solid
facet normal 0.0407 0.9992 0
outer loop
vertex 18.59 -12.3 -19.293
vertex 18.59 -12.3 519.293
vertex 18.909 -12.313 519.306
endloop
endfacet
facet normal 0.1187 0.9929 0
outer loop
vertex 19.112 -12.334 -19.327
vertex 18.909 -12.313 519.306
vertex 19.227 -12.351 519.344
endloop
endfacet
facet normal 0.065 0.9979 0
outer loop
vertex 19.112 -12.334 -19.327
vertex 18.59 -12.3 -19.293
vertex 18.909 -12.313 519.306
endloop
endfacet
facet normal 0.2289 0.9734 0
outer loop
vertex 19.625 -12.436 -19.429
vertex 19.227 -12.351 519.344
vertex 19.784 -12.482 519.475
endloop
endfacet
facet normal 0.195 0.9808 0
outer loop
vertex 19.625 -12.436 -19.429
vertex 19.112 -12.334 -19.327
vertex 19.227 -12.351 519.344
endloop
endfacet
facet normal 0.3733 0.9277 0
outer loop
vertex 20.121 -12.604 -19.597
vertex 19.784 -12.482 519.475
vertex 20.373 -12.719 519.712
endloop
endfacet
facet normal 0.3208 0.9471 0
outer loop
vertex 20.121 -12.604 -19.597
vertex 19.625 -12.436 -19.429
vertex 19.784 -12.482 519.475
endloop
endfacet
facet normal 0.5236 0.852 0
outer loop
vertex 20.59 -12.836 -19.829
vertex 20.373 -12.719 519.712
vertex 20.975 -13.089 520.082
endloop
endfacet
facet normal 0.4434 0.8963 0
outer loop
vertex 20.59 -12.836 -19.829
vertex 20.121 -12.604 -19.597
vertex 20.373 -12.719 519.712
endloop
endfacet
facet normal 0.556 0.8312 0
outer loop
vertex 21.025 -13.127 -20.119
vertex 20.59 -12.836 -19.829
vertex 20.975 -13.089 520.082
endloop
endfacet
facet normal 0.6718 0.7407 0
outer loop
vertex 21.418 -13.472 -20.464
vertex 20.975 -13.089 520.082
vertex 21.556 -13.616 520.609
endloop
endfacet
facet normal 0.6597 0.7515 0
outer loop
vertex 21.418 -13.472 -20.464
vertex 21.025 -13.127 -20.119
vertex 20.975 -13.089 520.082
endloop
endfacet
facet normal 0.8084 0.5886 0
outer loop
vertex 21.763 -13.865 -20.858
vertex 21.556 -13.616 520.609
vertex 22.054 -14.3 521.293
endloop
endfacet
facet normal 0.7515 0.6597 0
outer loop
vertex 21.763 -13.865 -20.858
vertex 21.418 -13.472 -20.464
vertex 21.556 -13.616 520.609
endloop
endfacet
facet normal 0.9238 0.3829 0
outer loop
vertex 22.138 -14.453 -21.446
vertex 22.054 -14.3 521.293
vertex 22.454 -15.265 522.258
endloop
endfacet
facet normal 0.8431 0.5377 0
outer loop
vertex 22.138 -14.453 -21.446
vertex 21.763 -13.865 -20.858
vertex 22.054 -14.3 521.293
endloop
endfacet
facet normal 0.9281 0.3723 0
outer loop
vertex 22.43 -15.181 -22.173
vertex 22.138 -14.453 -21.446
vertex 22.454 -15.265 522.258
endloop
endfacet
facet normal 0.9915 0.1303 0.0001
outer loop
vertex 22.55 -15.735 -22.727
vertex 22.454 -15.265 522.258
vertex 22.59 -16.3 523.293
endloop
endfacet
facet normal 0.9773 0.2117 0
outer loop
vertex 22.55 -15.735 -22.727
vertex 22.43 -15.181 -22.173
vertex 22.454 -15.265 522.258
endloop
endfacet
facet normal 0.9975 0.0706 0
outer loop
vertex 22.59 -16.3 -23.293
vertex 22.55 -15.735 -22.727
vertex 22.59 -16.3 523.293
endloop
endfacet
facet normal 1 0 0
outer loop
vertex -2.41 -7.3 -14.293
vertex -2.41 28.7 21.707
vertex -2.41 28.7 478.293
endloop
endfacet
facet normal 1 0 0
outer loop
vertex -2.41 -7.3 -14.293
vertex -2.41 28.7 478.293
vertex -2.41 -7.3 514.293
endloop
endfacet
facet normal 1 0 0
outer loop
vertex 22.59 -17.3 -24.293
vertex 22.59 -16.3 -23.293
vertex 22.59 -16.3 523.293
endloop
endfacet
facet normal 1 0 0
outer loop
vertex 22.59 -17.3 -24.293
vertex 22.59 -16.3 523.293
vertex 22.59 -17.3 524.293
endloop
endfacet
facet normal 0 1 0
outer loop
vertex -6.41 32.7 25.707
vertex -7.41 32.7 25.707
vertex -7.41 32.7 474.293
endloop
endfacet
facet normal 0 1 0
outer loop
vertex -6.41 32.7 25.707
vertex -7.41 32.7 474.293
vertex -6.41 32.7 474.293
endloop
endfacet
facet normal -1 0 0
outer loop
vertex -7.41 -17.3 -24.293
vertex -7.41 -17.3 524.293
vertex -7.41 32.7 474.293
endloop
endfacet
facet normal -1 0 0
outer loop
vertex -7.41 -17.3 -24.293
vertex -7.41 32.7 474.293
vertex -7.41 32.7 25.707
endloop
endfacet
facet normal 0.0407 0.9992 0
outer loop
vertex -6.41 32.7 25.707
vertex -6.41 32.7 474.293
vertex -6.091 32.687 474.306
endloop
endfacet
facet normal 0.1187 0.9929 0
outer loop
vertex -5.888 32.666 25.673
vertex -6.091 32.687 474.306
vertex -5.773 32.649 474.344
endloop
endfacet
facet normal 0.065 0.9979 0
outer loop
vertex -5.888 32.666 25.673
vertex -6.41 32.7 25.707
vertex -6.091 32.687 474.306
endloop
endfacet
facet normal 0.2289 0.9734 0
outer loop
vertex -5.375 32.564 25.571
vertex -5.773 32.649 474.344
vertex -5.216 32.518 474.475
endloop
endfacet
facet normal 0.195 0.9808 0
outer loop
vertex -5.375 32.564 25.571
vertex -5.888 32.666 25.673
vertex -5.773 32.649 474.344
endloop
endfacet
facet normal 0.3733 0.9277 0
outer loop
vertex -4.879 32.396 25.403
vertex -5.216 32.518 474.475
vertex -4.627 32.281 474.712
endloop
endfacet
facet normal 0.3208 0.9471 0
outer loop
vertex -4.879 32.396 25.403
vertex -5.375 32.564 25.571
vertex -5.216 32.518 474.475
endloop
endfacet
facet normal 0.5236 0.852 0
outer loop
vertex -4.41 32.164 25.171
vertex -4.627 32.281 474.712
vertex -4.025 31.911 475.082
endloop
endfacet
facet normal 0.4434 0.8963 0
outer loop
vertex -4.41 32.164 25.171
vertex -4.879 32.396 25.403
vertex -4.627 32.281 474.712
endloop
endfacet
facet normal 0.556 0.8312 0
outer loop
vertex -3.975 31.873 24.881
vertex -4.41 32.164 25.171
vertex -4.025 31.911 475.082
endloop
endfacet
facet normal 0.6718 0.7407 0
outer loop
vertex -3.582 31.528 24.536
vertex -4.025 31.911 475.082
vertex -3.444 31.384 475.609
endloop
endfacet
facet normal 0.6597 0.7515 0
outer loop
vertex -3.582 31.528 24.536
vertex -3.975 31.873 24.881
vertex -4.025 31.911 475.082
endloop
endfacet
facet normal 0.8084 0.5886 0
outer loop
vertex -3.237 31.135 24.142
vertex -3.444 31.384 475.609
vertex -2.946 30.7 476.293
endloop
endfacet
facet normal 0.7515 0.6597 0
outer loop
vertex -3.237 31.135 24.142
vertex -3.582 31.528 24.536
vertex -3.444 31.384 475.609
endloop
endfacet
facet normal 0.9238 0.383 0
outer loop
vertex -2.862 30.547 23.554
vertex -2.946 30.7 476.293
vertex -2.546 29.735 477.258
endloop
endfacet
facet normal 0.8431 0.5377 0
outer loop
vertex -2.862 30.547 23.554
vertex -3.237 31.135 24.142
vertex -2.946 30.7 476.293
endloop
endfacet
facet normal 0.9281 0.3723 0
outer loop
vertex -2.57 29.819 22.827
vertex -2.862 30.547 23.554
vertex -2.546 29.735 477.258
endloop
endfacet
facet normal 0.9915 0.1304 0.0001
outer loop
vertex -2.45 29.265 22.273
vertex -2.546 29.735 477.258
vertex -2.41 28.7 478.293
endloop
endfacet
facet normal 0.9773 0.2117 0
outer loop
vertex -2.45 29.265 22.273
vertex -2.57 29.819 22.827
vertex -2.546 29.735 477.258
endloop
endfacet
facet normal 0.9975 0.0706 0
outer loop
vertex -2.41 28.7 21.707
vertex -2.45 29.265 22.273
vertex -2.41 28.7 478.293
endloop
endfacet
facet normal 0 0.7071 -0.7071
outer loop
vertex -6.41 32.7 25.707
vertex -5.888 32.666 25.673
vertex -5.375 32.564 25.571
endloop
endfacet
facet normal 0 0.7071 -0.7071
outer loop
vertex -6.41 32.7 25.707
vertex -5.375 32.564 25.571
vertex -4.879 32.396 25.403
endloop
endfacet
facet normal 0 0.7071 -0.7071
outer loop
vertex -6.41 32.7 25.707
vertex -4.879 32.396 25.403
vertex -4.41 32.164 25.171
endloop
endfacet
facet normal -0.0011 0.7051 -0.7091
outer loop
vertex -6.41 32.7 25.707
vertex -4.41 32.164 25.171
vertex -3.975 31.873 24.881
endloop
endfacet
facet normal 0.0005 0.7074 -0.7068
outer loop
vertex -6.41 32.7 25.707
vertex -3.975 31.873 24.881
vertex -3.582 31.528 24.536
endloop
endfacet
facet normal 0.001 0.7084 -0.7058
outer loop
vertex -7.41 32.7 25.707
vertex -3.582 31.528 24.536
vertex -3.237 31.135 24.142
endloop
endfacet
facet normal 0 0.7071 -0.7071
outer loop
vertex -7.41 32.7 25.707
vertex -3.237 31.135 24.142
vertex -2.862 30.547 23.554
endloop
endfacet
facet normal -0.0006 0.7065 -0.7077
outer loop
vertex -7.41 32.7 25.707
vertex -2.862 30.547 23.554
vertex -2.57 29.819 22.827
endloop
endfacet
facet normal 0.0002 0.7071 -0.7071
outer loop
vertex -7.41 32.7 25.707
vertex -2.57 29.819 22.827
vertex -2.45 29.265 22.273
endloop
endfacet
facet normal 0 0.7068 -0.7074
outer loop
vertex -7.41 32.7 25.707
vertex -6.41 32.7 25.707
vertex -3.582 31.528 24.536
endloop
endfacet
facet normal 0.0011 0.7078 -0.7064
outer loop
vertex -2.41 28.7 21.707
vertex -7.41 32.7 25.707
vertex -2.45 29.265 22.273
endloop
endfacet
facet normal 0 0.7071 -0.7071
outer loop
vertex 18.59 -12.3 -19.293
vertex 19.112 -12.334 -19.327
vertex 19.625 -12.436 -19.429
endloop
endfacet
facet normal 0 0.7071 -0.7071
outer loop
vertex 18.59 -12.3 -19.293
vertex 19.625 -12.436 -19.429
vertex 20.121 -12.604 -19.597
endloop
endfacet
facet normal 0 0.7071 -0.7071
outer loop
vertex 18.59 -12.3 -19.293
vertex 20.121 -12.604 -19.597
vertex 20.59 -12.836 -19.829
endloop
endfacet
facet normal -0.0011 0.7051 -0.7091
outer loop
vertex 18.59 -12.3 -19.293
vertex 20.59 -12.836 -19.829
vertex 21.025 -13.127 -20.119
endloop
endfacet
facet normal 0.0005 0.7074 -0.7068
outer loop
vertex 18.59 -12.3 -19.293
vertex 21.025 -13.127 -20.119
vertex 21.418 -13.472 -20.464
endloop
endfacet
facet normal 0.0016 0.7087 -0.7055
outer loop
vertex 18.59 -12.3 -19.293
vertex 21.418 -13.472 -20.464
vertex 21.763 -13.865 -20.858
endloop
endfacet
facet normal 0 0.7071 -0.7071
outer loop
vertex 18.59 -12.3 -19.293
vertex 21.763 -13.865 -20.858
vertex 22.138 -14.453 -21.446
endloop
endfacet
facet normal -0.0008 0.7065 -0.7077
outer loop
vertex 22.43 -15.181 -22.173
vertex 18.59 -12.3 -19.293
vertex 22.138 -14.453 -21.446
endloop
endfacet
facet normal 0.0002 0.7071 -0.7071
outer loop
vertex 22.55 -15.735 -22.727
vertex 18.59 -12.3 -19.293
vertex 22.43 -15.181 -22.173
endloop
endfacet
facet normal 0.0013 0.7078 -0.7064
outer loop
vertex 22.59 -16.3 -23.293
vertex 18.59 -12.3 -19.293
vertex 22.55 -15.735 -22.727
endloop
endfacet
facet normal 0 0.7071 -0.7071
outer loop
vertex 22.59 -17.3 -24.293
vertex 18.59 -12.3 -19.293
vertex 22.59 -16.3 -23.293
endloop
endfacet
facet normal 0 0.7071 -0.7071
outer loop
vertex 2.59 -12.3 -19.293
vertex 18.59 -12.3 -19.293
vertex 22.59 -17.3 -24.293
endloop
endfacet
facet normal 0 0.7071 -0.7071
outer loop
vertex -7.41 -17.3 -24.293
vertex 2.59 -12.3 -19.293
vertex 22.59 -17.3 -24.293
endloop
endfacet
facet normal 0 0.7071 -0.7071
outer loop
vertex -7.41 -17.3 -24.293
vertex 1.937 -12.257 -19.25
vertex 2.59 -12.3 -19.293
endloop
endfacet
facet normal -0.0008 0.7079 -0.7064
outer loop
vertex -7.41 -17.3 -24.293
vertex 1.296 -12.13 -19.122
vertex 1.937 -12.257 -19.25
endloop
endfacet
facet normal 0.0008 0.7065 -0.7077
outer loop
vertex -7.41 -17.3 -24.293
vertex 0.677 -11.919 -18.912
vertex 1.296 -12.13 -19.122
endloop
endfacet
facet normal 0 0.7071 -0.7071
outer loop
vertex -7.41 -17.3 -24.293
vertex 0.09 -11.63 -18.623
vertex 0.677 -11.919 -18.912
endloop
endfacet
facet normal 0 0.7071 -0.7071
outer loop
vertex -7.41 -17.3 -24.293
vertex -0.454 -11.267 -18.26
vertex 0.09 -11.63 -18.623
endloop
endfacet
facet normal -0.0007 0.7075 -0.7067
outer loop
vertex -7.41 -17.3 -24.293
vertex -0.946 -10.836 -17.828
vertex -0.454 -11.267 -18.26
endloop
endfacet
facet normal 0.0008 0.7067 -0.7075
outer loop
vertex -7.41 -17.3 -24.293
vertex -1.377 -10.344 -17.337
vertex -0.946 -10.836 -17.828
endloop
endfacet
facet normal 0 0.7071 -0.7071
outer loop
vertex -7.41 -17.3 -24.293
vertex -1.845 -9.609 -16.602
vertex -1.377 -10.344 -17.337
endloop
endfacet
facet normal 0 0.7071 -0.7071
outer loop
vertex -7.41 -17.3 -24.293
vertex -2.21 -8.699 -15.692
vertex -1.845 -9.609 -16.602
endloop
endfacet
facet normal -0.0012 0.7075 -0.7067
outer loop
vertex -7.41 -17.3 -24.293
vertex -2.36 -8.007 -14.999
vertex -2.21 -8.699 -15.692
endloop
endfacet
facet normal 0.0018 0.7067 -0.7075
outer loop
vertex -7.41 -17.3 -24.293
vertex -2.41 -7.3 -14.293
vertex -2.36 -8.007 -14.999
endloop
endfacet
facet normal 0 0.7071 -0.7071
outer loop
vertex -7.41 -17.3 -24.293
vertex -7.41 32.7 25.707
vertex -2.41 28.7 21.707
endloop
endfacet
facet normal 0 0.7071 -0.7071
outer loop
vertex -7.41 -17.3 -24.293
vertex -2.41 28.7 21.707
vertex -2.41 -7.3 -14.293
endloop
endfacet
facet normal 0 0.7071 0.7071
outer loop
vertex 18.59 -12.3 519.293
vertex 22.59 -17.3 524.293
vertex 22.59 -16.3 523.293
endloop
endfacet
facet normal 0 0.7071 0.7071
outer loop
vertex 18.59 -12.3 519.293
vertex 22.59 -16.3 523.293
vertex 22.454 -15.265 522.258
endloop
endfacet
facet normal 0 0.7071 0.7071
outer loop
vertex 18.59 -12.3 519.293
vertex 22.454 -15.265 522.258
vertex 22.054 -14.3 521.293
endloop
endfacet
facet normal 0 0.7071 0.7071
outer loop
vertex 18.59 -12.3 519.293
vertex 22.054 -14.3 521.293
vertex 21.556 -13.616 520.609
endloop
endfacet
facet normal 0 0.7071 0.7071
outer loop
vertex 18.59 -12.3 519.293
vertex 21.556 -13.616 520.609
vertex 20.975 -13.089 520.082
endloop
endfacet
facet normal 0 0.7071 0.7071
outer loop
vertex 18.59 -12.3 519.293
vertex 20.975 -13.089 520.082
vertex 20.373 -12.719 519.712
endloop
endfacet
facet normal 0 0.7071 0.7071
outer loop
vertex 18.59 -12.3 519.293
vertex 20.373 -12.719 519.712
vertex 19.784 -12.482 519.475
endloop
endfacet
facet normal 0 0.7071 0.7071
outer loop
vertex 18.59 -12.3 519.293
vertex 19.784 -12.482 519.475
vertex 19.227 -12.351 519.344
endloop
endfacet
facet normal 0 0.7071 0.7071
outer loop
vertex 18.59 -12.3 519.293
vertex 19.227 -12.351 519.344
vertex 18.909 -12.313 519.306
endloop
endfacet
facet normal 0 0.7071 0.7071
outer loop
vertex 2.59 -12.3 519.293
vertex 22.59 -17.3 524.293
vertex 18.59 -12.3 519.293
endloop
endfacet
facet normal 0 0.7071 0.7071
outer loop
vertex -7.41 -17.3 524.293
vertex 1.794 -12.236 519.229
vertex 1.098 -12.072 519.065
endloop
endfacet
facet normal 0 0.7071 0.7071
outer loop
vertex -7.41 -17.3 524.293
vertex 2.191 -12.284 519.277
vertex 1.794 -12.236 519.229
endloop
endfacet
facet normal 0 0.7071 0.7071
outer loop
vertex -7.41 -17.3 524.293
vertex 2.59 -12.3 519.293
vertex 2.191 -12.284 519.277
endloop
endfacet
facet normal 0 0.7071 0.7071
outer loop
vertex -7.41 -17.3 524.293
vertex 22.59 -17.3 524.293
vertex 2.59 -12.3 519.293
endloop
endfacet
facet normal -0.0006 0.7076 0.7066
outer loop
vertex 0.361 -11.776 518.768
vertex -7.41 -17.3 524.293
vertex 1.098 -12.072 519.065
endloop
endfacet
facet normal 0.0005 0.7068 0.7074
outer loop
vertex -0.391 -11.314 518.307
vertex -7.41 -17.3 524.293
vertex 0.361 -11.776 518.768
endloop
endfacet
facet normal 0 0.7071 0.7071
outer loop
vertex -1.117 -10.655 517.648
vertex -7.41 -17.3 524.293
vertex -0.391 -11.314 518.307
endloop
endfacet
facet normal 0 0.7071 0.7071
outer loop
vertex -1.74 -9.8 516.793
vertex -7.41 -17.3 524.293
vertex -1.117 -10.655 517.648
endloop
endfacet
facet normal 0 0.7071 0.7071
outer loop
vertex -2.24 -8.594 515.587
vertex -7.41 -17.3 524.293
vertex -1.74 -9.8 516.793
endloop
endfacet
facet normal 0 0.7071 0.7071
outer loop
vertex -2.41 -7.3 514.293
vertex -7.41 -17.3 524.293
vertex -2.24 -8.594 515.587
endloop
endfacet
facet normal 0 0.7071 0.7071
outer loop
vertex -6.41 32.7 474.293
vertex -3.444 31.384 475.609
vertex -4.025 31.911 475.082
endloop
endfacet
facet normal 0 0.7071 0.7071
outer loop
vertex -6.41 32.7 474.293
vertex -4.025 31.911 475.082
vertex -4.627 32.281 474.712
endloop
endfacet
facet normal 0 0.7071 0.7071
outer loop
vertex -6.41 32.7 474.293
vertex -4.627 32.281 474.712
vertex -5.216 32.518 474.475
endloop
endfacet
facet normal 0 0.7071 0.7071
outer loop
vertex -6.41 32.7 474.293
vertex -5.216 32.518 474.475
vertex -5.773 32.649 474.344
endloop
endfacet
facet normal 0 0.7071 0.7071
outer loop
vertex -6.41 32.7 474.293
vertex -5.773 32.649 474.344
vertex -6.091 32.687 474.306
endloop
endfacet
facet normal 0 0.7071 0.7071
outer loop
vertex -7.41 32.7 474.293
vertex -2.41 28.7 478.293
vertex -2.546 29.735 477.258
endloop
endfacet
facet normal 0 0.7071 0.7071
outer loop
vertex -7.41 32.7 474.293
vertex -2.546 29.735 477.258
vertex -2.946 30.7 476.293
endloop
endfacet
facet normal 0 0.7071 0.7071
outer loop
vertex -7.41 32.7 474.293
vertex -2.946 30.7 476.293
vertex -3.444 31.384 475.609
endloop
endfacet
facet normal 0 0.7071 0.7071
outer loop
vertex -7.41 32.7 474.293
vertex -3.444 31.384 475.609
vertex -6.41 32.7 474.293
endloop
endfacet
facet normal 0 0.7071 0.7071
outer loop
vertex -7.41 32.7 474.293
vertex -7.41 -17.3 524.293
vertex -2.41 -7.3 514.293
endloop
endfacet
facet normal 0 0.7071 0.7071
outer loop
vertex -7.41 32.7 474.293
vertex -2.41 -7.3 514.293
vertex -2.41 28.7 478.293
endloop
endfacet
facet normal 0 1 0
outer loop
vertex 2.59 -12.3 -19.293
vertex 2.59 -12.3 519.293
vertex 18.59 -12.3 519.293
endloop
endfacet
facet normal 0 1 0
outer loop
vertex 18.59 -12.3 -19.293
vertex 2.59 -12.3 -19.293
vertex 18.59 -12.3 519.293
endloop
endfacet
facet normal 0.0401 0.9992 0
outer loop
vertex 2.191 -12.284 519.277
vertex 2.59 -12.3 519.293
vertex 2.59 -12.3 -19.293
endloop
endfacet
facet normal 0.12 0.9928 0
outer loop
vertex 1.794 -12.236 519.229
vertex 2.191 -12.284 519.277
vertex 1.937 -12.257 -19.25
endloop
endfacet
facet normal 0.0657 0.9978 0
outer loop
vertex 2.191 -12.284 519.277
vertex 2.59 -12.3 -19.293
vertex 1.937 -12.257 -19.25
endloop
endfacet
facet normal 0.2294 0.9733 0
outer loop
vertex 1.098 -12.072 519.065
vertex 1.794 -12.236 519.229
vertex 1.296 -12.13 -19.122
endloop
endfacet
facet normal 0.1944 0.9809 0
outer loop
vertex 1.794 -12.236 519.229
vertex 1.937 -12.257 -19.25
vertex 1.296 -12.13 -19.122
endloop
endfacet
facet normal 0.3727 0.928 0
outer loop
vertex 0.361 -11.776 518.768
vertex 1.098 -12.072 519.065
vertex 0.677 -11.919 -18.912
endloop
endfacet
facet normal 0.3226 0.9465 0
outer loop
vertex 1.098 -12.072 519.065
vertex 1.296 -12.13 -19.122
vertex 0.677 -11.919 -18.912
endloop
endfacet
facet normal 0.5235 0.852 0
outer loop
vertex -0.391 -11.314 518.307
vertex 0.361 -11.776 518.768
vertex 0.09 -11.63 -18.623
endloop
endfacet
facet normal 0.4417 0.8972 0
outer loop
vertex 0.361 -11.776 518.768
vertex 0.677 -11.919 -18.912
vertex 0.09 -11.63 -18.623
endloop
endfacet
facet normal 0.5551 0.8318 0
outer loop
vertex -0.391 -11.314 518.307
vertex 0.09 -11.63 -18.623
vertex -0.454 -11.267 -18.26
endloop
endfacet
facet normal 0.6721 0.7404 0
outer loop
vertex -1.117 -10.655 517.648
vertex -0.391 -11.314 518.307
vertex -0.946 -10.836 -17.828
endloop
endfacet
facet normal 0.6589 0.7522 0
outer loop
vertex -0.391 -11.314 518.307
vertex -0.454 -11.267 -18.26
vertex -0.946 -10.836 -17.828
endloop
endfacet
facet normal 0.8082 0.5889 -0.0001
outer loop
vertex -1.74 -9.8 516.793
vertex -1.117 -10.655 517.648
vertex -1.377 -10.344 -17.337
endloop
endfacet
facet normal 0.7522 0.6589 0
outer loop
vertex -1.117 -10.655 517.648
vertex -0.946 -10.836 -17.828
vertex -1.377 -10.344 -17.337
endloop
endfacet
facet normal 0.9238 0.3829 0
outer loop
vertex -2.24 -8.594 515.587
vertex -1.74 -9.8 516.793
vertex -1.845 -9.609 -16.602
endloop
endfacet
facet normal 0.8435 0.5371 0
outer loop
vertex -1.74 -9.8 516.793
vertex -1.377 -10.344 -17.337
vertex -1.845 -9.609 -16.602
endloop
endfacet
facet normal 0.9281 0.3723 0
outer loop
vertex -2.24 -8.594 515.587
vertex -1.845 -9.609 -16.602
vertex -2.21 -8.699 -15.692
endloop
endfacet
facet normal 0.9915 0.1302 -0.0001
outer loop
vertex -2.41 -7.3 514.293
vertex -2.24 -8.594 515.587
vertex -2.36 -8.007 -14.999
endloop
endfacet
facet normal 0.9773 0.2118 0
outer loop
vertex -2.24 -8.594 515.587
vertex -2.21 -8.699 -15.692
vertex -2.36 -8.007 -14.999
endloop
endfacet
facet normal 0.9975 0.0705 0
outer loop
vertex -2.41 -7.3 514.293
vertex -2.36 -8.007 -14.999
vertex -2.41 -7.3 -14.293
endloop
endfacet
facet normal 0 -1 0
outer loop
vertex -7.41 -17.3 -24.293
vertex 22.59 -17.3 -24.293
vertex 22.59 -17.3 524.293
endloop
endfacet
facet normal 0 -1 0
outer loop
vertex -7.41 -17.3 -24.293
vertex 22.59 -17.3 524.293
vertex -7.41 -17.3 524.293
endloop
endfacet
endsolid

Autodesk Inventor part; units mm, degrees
ref_plane "Start Plane" through (0, 0, -24.2929) normal (0, 0, 1) x (1, 0, 0)
ref_plane "End Plane" through (0, 0, 524.2929) normal (0, 0, 1) x (1, 0, 0)
sketch "Sketch" plane through (0, 0, 0) normal (0, 0, 1) x (1, 0, 0)
  line L0 (-2.41, 28.7) -> (-2.41, -7.3)
  line L1 (-7.41, 32.7) -> (-6.41, 32.7)
  line L2 (-7.41, -17.3) -> (-7.41, 32.7)
  line L3 (22.59, -17.3) -> (-7.41, -17.3)
  line L4 (22.59, -16.3) -> (22.59, -17.3)
  line L5 (2.59, -12.3) -> (18.59, -12.3)
  arc A0 (-2.41, -7.3) -> (2.59, -12.3) centre (2.59, -7.3) ccw
  arc A1 (-2.41, 28.7) -> (-6.41, 32.7) centre (-6.41, 28.7) ccw
  arc A2 (22.59, -16.3) -> (18.59, -12.3) centre (18.59, -16.3) ccw
  line L6 (0, 43.6941) -> (0, -27.4657) construction
  line L7 (-13.5757, 0) -> (29.5841, 0) construction
  point P0 (-2.41, 32.7)
  point P1 (-2.41, -12.3)
  point P2 (22.59, -12.3)
  dimension "d4" = 30
  dimension "d6" = 50
  dimension "d8" = 5
  dimension "d10" = 5
  dimension "d17" = 5
  dimension "d18" = 4
  dimension "d19" = 17.3
  dimension "d20" = 7.41
extrude "Body" add sketch "Sketch" along normal up to surface (548.5858 mm away) from surface at -24.2929
sketch "Sketch3" plane through (0, 0, 0) normal (0, 0, 1) x (1, 0, 0)
  line L0 (0, 0) -> (10, 0)
ref_plane "Work Plane10" through (0, 0, 0) normal (0, -1, 0) x (1, 0, 0)
sketch "Sketch4" plane through (0, 0, 0) normal (0, -1, 0) x (1, 0, 0)
  line L0 (-2, -24.2929) -> (12, -24.2929)
  line L1 (-2, 524.2929) -> (12, 524.2929)
  dimension "d24" = 548.5858
ref_plane "Work Plane11" through (7.59, -17.6536, 524.6464) normal (0, 0.7071, 0.7071) x (1, 0, 0)
split "Split1" plane through (7.59, -17.6536, 524.6464) removes the side toward (0, 0.7071, 0.7071)
ref_plane "Work Plane12" through (7.59, -17.6536, -24.6464) normal (0, 0.7071, -0.7071) x (1, 0, 0)
split "Split2" plane through (7.59, -17.6536, -24.6464) removes the side toward (0, 0.7071, -0.7071)
equation "\"d4\" = b"
equation "\"d6\" = ParH"
equation "\"d8\" = ParT"
equation "\"d10\" = ParT"
equation "\"d17\" = R"
equation "\"d18\" = R1"
equation "\"d19\" = ex"
equation "\"d20\" = ey"
equation "\"d11\" = G_L"
equation "\"b\" = 30"
equation "\"ParT\" = 5"
equation "\"R1\" = 4"
equation "\"G_L\" = d24"
equation "\"ParH\" = 50"
equation "\"R\" = 5"
equation "\"ey\" = 7.41"
equation "\"ex\" = 17.3"
equation "\"G_OFFSET_START\" = 24.29289"
equation "\"G_OFFSET_END\" = 24.29289"
equation "\"d21\" = -G_OFFSET_START"
equation "\"d22\" = G_OFFSET_END + B_L"
equation "\"B_L\" = 500"
properties part number "ISO 657-2 - 50x 30x 5-548.59" material "Steel, Mild"
